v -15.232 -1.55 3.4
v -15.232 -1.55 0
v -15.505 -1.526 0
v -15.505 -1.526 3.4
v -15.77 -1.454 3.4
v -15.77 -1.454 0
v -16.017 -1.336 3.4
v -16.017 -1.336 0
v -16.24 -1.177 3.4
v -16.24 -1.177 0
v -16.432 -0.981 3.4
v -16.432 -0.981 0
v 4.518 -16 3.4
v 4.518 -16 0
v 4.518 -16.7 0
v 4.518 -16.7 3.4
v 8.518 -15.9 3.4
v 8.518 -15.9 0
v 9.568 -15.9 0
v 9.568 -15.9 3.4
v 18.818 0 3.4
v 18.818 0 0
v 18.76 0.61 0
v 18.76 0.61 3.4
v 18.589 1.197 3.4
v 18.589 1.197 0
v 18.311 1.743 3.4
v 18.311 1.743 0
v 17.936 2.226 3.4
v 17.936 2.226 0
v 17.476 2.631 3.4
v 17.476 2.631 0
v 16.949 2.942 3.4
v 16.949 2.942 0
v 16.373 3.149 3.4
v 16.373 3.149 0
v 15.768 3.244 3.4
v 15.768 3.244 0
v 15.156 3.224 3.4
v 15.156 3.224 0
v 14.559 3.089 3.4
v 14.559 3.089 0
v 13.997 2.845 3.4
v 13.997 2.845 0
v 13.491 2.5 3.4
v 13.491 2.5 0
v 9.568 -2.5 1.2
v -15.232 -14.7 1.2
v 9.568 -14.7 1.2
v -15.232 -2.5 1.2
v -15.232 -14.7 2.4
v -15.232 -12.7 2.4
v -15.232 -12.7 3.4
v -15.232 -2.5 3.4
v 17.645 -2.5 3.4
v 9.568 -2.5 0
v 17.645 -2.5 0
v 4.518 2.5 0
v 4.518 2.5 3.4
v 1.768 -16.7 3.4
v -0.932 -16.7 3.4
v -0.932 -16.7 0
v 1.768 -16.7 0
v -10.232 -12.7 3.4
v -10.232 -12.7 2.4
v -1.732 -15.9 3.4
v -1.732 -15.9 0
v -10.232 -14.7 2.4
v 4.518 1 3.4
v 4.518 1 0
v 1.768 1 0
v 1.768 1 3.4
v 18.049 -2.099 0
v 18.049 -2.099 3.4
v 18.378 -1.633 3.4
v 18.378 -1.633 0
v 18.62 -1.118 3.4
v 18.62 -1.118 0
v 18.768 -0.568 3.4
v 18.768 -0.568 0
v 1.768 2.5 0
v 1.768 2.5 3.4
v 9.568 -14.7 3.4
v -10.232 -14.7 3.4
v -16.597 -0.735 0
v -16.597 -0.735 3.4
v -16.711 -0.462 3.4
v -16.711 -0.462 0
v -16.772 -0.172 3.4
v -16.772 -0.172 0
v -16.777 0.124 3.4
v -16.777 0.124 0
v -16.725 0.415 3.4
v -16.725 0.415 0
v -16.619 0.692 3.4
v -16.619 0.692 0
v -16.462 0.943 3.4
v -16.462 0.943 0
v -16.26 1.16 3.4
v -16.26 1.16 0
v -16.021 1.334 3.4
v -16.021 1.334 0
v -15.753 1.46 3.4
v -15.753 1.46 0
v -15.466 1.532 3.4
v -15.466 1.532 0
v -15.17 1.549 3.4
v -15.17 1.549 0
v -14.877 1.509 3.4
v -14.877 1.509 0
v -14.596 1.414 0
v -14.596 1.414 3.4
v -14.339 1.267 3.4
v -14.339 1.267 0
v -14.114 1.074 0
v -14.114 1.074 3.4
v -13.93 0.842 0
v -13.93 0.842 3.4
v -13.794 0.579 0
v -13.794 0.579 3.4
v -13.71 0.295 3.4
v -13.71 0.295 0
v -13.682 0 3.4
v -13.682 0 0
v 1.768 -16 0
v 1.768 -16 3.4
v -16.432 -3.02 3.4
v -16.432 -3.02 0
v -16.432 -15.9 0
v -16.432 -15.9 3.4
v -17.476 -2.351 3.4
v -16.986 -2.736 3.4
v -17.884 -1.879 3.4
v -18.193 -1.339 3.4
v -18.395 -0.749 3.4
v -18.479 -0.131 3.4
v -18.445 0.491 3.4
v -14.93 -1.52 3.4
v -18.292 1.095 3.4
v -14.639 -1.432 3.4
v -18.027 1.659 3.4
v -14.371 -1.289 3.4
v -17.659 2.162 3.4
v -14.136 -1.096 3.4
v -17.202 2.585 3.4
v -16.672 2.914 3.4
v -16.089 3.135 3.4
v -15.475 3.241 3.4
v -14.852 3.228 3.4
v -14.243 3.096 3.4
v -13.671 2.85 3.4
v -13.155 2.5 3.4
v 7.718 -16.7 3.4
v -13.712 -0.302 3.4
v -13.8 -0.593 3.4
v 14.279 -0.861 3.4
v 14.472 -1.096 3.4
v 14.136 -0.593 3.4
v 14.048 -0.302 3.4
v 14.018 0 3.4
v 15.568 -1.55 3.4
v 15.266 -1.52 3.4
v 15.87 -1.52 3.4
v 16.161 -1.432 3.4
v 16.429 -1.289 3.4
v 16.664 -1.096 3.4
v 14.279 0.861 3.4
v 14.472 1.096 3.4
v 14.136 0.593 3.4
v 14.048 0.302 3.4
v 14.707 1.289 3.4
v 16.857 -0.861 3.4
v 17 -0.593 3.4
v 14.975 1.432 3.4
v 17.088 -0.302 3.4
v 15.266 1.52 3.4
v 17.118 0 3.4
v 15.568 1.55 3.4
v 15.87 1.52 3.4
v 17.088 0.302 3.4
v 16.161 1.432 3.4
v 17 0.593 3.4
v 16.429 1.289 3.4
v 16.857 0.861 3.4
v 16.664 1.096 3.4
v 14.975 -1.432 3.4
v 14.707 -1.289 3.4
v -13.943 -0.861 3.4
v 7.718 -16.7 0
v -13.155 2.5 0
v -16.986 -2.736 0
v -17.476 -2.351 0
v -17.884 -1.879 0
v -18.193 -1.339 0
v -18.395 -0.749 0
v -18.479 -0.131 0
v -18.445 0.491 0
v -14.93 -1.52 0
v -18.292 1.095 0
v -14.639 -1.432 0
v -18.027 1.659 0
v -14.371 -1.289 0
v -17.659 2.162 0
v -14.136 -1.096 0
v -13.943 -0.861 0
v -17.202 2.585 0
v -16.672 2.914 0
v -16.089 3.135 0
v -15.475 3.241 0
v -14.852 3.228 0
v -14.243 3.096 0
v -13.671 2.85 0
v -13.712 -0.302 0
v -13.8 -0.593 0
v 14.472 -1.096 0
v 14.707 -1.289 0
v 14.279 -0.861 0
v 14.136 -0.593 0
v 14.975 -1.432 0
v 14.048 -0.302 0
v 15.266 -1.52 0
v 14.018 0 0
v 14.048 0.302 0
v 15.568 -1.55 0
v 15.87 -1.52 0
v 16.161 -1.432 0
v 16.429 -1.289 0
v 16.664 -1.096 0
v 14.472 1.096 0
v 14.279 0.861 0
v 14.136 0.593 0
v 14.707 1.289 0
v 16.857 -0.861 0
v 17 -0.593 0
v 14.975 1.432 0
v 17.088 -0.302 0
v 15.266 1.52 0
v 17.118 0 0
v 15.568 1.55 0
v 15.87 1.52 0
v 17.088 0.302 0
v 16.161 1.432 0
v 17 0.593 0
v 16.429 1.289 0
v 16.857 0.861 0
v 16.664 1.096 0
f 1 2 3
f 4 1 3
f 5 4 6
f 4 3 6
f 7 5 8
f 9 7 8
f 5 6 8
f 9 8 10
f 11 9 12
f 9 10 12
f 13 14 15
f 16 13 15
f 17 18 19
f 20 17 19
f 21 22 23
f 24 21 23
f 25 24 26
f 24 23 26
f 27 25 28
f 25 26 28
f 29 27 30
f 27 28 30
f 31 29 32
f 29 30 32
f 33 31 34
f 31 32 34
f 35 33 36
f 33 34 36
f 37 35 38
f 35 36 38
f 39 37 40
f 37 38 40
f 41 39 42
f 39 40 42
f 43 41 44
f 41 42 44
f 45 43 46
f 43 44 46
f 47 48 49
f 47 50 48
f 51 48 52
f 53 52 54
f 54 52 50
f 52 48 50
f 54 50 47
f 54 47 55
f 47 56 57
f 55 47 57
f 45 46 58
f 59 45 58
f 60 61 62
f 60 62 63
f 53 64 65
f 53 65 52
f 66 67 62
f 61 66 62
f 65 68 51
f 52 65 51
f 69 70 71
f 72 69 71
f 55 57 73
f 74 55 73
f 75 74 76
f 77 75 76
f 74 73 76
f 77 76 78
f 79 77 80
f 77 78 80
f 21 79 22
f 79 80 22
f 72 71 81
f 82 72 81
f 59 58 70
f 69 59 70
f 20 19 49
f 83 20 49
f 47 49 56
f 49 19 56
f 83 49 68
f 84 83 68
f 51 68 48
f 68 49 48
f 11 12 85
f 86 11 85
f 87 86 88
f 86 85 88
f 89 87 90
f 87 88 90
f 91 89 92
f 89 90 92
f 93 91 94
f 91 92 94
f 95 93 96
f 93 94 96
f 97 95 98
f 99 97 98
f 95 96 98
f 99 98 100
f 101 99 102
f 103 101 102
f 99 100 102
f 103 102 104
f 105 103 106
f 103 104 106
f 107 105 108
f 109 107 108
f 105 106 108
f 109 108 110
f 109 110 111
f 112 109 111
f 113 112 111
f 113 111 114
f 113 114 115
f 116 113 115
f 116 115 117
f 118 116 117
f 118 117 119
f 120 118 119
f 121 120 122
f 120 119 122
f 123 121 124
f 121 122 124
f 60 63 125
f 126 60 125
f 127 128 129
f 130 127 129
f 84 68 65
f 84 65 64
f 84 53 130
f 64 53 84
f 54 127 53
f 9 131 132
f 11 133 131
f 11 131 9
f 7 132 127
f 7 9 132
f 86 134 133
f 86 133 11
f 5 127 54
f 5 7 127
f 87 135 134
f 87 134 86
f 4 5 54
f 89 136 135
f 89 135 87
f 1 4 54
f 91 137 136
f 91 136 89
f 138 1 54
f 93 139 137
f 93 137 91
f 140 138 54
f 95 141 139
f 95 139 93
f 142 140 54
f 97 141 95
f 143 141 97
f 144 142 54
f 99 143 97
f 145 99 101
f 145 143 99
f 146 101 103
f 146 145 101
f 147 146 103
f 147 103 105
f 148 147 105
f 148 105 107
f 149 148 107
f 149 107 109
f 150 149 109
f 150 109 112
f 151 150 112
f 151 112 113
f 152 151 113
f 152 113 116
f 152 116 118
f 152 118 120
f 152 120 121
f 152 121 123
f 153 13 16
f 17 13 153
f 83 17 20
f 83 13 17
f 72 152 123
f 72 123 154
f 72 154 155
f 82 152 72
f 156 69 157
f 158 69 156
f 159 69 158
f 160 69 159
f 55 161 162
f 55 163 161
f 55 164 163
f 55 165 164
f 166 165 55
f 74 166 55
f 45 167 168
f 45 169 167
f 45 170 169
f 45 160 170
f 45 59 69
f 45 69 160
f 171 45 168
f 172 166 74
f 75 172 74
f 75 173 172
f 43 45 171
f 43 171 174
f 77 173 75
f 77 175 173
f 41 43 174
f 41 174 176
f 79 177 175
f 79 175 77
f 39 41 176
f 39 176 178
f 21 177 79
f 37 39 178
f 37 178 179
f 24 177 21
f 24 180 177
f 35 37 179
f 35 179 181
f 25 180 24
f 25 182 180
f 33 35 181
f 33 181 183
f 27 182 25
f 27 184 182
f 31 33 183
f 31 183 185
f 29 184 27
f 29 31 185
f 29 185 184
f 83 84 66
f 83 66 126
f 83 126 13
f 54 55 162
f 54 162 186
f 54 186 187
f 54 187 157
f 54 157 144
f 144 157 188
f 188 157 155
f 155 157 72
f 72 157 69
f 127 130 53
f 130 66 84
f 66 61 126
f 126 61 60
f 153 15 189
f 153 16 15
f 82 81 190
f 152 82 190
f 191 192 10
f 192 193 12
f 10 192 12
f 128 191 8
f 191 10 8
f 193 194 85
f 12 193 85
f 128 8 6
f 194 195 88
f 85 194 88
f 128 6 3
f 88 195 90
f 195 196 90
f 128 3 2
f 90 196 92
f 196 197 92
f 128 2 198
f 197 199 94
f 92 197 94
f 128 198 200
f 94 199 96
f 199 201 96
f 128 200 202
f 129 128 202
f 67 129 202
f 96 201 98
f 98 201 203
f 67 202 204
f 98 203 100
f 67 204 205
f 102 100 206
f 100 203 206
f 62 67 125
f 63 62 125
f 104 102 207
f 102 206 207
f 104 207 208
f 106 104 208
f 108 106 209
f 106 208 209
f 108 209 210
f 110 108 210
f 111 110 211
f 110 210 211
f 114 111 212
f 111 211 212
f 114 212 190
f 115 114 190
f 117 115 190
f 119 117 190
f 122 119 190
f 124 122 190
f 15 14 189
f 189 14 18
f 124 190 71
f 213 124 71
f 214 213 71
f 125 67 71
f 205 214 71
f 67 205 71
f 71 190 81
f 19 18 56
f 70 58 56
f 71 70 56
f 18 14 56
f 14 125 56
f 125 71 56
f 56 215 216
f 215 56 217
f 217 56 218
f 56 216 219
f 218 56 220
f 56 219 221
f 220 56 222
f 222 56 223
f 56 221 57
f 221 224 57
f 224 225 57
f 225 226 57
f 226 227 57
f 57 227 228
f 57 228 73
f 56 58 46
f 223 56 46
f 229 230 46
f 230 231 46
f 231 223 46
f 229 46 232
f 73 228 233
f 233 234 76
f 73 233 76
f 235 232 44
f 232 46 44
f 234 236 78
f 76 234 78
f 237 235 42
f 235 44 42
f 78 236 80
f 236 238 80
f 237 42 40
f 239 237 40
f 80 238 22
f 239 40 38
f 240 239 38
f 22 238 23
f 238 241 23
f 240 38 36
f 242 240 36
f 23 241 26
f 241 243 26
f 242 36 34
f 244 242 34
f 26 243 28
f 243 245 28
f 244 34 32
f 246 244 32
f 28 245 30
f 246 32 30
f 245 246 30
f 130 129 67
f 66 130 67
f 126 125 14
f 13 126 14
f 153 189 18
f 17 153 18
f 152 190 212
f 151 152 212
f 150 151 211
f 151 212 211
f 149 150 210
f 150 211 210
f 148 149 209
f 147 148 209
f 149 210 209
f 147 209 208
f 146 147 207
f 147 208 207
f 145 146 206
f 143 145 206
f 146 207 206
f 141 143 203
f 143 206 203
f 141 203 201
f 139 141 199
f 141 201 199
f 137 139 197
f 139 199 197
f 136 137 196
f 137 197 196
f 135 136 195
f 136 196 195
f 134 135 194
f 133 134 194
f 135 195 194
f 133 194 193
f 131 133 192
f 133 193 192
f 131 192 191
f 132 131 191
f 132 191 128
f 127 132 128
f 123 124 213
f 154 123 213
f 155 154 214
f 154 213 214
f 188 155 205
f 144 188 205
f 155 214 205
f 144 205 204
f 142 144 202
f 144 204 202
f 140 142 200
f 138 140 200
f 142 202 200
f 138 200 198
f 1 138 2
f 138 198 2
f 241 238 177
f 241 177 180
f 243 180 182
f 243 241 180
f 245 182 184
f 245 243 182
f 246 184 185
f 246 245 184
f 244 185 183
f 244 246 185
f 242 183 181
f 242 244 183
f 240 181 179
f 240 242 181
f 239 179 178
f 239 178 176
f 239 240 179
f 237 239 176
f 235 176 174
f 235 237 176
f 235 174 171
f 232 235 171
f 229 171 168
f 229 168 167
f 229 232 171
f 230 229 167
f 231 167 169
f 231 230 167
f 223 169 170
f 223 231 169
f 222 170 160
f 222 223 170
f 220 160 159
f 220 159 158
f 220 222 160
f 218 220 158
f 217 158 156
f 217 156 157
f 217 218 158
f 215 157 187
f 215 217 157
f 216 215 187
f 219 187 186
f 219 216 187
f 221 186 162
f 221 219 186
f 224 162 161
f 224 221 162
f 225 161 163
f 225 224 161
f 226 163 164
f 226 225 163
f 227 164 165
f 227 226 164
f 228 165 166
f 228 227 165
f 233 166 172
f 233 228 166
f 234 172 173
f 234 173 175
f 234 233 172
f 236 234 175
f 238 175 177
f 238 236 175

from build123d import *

# Parameters (mm, degrees)
F0_W        = 21.3
F0_H        = 2.5
F0_R        = 1.55
F1_DEPTH    = 3.4
F0_W_2      = 1.2
F0_H_2      = 1.2
F0_W_3      = 3.5
F2_DEPTH    = 3.4
F0_H_3      = 12.2
F3_DEPTH    = 1.2
F4_W        = 5
F4_H        = 1
F5_DEPTH    = 2
F6_T4_DEPTH = 3.4
F6_T9_DEPTH = 3.4


# Not quite as in the source:
# - a fillet or chamfer that OpenCascade refuses, or shapes differently, is made with other operations: its cross-section is extruded or revolved along the edge and cut away or added
# - a feature names something its author has since deleted; it is built from what else it names


with BuildPart() as f1:
    # F0 (on Top) → F1 (new body)
    with BuildSketch(Plane.XY):
        with BuildLine():
            ThreePointArc((-16.4319353276, -0.9810708435), (-15.752751994, 1.4598801321), (-13.6819353276, 0))
            ThreePointArc((-13.6819353276, 0), (-14.1359198167, -1.0960155108), (-15.2319353276, -1.55))
            Line((-15.2319353276, -1.55), (-15.2319353276, -2.5))
            Line((-15.2319353276, -2.5), (-13.1552793618, -2.5))
            ThreePointArc((-13.1552793618, -2.5), (-12.2898585195, -1.3808273084), (-11.9819353276, 0))
            ThreePointArc((-11.9819353276, 0), (-12.2898585195, 1.3808273084), (-13.1552793618, 2.5))
            ThreePointArc((-13.1552793618, 2.5), (-18.0266966766, 1.6588577401), (-16.4319353276, -3.0203476621))
            Line((-16.4319353276, -3.0203476621), (-16.4319353276, -2.5))
            Line((-16.4319353276, -2.5), (-16.4319353276, -0.9810708435))
        make_face()
        with BuildLine():
            ThreePointArc((-15.2319353276, -1.55), (-15.8959534721, -1.4005641377), (-16.4319353276, -0.9810708435))
            Line((-16.4319353276, -0.9810708435), (-16.4319353276, -2.5))
            Line((-16.4319353276, -2.5), (-15.2319353276, -2.5))
            Line((-15.2319353276, -2.5), (-15.2319353276, -1.55))
        make_face()
        with BuildLine():
            ThreePointArc((-11.9819353276, 0), (-12.2898585195, -1.3808273084), (-13.1552793618, -2.5))
            Line((-13.1552793618, -2.5), (-11.7319353276, -2.5))
            Line((-11.7319353276, -2.5), (-11.7319353276, 0))
            Line((-11.7319353276, 0), (-11.9819353276, 0))
        make_face()
        with BuildLine():
            Line((1.7680646724, 2.5), (-13.1552793618, 2.5))
            ThreePointArc((-13.1552793618, 2.5), (-12.2898585195, 1.3808273084), (-11.9819353276, 0))
            Line((-11.9819353276, 0), (-11.7319353276, 0))
            Line((-11.7319353276, 0), (9.5680646724, 0))
            Line((9.5680646724, 0), (9.5680646724, -2.5))
            Line((9.5680646724, -2.5), (13.4914087067, -2.5))
            ThreePointArc((13.4914087067, -2.5), (12.3180646724, 0), (13.4914087067, 2.5))
            Line((13.4914087067, 2.5), (4.5180646724, 2.5))
            Line((4.5180646724, 2.5), (4.5180646724, 1))
            Line((4.5180646724, 1), (1.7680646724, 1))
            Line((1.7680646724, 1), (1.7680646724, 2.5))
        make_face()
        with Locations((-1.0819353276, -1.25)):
            Rectangle(F0_W, F0_H)
        with BuildLine():
            ThreePointArc((13.4914087067, 2.5), (12.3180646724, 0), (13.4914087067, -2.5))
            Line((13.4914087067, -2.5), (17.6447206382, -2.5))
            ThreePointArc((17.6447206382, -2.5), (18.5101414805, -1.3808273084), (18.8180646724, 0))
            ThreePointArc((18.8180646724, 0), (16.9488919809, 2.942076808), (13.4914087067, 2.5))
        make_face()
        with Locations((15.5680646724, 0)):
            Circle(F0_R, mode=Mode.SUBTRACT)
    extrude(amount=F1_DEPTH)

    # F0 (on Top) → F2 (join)
    with BuildSketch(Plane.XY):
        with BuildLine():
            ThreePointArc((-15.2319353276, -3.25), (-15.8428240646, -3.1920706369), (-16.4319353276, -3.0203476621))
            Line((-16.4319353276, -3.0203476621), (-16.4319353276, -14.7))
            Line((-16.4319353276, -14.7), (-15.2319353276, -14.7))
            Line((-15.2319353276, -14.7), (-15.2319353276, -3.25))
        make_face()
        with BuildLine():
            Line((-15.2319353276, -2.5), (-16.4319353276, -2.5))
            Line((-16.4319353276, -2.5), (-16.4319353276, -3.0203476621))
            ThreePointArc((-16.4319353276, -3.0203476621), (-15.8428240646, -3.1920706369), (-15.2319353276, -3.25))
            Line((-15.2319353276, -3.25), (-15.2319353276, -2.5))
        make_face()
        with Locations((-15.8319353276, -15.3)):
            Rectangle(F0_W_2, F0_H_2)
        with Locations((-13.4819353276, -15.3)):
            Rectangle(F0_W_3, F0_H_2)
        Polygon((9.5680646724, -14.7), (-11.7319353276, -14.7), (-11.7319353276, -15.9), (-0.2319353276, -15.9), (7.0180646724, -15.9), (9.5680646724, -15.9), align=None)
        Polygon((7.0180646724, -15.9), (-0.2319353276, -15.9), (-0.2319353276, -16.7), (1.7680646724, -16.7), (1.7680646724, -16), (4.5180646724, -16), (4.5180646724, -16.7), (7.0180646724, -16.7), align=None)
    extrude(amount=F2_DEPTH)

    # F0 (on Top) → F3 (join)
    with BuildSketch(Plane.XY):
        with BuildLine():
            ThreePointArc((-13.1552793618, -2.5), (-14.1279652193, -3.0567548152), (-15.2319353276, -3.25))
            Line((-15.2319353276, -3.25), (-15.2319353276, -14.7))
            Line((-15.2319353276, -14.7), (-11.7319353276, -14.7))
            Line((-11.7319353276, -14.7), (-11.7319353276, -2.5))
            Line((-11.7319353276, -2.5), (-13.1552793618, -2.5))
        make_face()
        with BuildLine():
            Line((-13.1552793618, -2.5), (-15.2319353276, -2.5))
            Line((-15.2319353276, -2.5), (-15.2319353276, -3.25))
            ThreePointArc((-15.2319353276, -3.25), (-14.1279652193, -3.0567548152), (-13.1552793618, -2.5))
        make_face()
        with Locations((-1.0819353276, -8.6)):
            Rectangle(F0_W, F0_H_3)
    extrude(amount=F3_DEPTH)

    # F4 (on face) → F5 (join)
    with BuildSketch(Plane(origin=(0, -14.7, 0), x_dir=(-1, 0, 0), z_dir=(0, 1, 0))):
        with Locations((12.7319353276, 2.9)):
            Rectangle(F4_W, F4_H)
    extrude(amount=F5_DEPTH)

    # F6: chamfer of 1.5 on 2 edges, made by hand


with BuildPart() as f6_tool2:
    # F6_s3 → F6_t4 (new body)
    with BuildSketch(Plane.XY):
        Polygon((-1.7319353276, -15.9), (-0.2319353276, -17.4), (-0.2319353276, -15.9), align=None)
    extrude(amount=F6_T4_DEPTH)

    split(bisect_by=Plane.XZ.offset(16.7), keep=Keep.BOTTOM)


with BuildPart() as f1_1:
    add(f1.part)

    # F6_t1: union F6_tool2
    add(f6_tool2.part)


with BuildPart() as f6_tool7:
    # F6_s8 → F6_t9 (new body)
    with BuildSketch(Plane.XY):
        Polygon((7.0180646724, -17.4), (8.5180646724, -15.9), (7.0180646724, -15.9), align=None)
    extrude(amount=F6_T9_DEPTH)

    split(bisect_by=Plane.XZ.offset(16.7), keep=Keep.BOTTOM)


with BuildPart() as f1_2:
    add(f1_1.part)

    # F6_t6: union F6_tool7
    add(f6_tool7.part)


solid = f1_2.part
